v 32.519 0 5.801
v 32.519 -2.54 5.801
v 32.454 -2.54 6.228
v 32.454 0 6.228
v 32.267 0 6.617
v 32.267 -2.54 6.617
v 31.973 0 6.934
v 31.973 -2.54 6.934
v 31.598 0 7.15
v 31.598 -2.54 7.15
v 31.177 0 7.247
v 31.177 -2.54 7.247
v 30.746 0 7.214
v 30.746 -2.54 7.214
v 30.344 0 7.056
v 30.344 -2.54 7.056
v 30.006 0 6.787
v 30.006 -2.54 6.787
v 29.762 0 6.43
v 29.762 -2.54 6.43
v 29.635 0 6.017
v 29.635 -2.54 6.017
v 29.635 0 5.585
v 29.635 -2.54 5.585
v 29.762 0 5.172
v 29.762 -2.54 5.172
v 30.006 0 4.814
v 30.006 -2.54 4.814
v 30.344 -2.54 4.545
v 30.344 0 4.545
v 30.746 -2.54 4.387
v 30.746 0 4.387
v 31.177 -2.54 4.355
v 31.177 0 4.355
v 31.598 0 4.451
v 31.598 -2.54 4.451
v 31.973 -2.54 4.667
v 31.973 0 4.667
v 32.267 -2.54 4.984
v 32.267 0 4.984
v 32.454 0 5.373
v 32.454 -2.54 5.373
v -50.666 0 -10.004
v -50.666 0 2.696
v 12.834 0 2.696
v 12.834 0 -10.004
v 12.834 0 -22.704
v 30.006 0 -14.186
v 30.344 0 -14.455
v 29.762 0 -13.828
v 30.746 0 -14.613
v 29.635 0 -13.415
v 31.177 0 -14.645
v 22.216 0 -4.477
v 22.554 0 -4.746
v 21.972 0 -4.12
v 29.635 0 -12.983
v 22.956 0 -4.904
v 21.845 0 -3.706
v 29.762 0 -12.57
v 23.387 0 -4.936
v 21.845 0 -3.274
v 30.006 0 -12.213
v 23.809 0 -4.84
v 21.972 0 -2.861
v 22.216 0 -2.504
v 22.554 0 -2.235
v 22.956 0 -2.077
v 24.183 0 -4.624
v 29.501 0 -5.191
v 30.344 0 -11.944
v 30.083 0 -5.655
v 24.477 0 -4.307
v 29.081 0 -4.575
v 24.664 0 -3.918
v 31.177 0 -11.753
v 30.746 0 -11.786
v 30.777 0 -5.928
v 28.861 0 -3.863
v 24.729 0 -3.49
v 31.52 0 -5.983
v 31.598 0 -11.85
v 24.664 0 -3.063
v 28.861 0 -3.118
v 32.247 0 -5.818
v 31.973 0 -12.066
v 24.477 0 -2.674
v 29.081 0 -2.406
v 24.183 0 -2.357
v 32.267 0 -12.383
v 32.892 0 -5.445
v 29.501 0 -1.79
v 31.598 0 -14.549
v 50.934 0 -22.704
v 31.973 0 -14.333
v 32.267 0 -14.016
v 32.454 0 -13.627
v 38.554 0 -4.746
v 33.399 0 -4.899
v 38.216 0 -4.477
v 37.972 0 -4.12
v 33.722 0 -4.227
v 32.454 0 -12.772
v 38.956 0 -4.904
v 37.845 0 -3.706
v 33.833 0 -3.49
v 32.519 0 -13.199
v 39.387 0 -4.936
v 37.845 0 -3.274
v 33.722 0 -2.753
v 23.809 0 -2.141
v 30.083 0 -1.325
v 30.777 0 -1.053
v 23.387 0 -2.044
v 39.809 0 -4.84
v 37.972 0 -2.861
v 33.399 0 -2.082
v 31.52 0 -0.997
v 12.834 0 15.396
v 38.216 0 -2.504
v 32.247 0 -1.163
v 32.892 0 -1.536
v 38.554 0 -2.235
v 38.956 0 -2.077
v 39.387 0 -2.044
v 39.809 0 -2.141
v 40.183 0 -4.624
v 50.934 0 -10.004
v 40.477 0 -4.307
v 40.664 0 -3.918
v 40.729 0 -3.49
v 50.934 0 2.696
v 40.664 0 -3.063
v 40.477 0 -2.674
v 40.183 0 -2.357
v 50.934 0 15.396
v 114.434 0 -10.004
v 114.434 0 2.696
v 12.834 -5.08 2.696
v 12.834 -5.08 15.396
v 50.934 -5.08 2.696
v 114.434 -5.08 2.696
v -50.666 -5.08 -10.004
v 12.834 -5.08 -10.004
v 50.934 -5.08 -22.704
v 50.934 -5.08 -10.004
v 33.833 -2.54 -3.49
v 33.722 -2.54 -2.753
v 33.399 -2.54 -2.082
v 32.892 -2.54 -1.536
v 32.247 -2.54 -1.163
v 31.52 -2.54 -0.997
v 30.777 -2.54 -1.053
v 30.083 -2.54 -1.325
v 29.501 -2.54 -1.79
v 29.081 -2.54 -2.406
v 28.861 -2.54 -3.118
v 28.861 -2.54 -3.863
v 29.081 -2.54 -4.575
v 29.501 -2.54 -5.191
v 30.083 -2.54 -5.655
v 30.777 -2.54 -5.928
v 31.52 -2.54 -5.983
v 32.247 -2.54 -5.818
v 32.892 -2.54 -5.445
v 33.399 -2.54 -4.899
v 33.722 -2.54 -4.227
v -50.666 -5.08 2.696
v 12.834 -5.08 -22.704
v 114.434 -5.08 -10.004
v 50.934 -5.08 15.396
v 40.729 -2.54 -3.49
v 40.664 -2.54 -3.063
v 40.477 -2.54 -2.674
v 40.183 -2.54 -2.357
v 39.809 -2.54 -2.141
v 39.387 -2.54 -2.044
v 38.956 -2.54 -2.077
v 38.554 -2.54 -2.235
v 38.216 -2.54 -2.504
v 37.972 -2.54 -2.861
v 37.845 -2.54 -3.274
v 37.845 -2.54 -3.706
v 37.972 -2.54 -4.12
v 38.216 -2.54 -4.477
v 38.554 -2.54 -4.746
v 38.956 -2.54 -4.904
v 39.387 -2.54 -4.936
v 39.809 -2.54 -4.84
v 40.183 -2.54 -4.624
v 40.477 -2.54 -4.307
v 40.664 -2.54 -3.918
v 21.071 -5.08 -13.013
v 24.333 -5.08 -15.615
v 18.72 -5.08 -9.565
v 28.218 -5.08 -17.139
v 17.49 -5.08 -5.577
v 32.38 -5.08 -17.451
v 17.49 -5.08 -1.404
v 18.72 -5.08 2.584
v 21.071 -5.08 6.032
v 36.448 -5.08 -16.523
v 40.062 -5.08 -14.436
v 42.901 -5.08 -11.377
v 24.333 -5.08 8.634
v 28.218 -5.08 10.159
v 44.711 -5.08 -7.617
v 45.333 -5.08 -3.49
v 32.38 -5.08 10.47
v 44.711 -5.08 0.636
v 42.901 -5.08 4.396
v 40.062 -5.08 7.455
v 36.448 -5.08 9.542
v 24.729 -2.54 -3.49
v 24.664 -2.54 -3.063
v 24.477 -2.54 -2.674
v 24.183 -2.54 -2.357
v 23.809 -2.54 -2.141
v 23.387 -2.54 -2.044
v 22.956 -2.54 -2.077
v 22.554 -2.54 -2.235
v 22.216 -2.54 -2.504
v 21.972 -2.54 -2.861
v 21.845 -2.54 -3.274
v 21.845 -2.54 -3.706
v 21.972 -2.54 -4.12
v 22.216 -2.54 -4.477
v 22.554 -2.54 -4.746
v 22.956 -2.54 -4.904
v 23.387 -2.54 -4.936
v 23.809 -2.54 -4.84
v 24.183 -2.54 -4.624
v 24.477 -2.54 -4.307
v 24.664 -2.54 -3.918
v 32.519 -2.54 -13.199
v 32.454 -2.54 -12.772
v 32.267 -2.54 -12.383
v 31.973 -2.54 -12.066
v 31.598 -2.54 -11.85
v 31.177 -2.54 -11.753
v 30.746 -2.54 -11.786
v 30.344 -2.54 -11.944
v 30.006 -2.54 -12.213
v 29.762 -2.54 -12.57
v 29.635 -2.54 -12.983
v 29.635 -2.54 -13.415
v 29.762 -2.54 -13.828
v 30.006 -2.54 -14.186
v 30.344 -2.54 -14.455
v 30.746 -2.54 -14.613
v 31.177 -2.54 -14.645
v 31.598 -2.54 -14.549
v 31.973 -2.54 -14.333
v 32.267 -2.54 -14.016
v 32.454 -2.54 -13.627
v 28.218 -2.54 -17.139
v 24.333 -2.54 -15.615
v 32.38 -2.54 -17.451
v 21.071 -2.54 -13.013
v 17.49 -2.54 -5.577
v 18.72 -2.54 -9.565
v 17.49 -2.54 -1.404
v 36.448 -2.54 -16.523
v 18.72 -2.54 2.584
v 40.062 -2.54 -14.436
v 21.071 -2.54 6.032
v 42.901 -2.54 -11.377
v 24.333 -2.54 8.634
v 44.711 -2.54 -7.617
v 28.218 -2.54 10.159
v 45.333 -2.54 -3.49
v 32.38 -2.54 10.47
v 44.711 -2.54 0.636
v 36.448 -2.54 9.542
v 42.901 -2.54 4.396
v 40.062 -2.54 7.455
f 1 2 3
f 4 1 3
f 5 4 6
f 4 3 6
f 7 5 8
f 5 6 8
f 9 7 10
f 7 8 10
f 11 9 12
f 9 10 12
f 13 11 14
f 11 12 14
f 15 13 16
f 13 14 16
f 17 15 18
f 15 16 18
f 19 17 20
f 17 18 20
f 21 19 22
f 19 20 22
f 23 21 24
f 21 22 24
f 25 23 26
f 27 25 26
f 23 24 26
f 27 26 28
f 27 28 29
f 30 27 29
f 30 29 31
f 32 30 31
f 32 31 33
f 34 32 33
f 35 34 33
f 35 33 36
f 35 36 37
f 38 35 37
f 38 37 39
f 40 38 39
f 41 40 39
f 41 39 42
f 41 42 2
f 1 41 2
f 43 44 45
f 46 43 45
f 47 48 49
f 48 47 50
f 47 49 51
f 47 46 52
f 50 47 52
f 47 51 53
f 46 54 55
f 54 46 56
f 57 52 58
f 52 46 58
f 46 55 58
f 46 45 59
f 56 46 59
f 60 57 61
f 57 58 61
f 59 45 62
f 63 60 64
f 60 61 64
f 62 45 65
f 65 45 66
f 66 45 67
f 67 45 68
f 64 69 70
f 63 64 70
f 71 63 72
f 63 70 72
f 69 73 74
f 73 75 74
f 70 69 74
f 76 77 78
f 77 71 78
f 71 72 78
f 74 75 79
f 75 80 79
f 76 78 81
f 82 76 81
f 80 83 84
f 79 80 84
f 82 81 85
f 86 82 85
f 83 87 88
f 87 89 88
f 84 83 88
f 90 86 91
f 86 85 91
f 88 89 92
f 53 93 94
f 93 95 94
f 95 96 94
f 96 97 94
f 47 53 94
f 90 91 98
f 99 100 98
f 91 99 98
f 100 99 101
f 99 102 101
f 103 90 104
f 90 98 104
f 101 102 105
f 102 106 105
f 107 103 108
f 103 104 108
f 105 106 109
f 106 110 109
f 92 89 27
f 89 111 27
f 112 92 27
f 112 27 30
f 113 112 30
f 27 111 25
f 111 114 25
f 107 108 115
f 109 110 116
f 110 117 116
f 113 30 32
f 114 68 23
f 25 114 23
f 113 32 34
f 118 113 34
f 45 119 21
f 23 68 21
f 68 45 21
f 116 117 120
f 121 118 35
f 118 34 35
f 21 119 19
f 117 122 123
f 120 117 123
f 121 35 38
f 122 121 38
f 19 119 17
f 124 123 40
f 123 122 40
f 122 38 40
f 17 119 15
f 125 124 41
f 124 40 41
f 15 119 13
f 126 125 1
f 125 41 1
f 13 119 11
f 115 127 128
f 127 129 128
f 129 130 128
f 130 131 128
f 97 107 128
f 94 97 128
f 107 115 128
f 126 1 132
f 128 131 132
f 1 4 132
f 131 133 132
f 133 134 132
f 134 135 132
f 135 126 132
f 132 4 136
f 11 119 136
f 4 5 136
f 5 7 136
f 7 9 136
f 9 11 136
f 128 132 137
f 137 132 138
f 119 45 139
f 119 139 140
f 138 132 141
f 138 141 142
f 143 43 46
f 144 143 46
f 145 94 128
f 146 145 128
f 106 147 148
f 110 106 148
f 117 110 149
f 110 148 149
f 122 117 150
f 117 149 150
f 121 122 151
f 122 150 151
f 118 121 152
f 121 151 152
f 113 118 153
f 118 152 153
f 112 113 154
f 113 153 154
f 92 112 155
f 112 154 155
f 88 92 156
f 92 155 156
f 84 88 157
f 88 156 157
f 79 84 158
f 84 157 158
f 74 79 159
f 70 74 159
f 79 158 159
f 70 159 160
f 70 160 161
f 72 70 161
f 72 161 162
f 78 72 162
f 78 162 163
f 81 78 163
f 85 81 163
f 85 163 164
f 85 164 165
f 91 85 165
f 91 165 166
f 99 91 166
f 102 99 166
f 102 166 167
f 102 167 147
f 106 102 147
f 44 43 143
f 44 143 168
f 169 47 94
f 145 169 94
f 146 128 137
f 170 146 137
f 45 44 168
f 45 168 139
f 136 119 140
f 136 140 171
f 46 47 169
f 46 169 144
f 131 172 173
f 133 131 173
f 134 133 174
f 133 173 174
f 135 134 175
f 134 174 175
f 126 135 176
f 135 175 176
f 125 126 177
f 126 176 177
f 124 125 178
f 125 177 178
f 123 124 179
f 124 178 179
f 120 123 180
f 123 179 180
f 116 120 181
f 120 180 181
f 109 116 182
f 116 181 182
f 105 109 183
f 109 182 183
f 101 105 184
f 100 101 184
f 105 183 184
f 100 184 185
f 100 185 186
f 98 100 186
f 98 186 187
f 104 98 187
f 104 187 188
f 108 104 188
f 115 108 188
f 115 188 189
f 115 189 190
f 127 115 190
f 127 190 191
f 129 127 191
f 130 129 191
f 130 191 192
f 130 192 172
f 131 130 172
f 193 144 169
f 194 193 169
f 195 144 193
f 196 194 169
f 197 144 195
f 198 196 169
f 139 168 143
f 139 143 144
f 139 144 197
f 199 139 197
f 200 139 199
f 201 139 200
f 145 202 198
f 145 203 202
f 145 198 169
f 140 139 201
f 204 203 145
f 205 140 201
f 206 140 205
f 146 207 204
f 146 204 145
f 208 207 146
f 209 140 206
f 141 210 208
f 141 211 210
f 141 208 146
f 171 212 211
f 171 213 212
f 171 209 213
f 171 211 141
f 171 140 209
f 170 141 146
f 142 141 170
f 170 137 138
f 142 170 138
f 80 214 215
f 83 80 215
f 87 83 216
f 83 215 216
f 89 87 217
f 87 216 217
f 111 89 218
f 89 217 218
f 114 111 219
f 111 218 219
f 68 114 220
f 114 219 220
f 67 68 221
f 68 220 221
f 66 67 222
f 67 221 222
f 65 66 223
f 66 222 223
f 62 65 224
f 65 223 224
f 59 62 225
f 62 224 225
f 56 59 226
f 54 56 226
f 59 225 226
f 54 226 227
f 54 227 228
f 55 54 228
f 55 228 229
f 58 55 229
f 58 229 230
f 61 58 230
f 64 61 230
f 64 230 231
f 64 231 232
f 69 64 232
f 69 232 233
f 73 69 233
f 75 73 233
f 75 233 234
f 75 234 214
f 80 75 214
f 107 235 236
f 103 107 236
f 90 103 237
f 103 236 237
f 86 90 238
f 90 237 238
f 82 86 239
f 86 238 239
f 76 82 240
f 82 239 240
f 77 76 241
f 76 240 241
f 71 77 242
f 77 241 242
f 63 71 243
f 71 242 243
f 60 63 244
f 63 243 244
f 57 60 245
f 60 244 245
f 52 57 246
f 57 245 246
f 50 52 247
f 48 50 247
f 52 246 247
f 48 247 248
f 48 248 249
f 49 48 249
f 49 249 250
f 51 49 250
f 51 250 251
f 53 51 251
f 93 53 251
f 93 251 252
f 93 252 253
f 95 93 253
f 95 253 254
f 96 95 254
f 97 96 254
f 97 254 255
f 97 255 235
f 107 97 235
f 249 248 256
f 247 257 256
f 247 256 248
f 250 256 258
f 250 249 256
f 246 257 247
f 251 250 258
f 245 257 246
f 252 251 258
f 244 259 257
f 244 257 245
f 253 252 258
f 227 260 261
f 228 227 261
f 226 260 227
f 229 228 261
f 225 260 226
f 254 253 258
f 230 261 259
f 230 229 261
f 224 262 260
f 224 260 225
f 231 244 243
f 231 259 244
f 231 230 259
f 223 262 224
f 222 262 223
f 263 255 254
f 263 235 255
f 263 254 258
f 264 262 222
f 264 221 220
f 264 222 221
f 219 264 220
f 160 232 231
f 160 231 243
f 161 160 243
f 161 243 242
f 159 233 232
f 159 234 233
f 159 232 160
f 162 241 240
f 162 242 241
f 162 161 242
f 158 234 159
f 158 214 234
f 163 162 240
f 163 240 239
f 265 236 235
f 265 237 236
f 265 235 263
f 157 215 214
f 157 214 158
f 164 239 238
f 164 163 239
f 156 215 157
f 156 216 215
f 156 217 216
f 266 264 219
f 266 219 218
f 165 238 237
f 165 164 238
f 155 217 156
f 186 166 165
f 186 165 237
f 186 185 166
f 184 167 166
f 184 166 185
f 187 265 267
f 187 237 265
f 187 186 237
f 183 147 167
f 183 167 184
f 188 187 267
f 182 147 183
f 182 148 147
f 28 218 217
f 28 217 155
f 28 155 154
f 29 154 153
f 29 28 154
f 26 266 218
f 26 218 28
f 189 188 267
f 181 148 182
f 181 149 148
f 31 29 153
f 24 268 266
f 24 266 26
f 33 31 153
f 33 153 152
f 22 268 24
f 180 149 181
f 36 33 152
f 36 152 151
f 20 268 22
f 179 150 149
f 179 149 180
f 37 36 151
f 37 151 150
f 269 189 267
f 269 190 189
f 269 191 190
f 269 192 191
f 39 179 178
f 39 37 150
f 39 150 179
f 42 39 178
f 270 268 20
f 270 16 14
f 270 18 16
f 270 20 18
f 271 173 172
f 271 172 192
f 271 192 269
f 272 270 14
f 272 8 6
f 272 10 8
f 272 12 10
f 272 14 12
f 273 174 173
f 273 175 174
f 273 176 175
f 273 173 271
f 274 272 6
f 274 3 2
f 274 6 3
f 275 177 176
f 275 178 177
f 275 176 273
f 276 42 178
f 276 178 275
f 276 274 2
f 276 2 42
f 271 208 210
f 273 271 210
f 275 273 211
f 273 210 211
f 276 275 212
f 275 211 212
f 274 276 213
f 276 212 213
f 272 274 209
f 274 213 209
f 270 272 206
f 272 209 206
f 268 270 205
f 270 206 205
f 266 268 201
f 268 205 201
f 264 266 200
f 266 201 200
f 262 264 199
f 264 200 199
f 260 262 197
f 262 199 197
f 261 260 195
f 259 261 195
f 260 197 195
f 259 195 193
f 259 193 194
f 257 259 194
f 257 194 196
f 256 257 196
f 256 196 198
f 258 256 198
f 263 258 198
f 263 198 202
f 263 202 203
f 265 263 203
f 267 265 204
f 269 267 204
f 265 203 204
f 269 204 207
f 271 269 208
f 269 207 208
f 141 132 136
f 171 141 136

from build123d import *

# Parameters (mm, degrees)
F0_W     = 63.5
F0_H     = 12.7
F0_W_2   = 38.1
F1_DEPTH = 5.08
F2_R     = 14
F3_DEPTH = 2.54
F4_R     = 1.45
F4_R_2   = 2.5
F5_DEPTH = 25.4


with BuildPart() as f1:
    # F0 (on Front) → F1 (new body)
    with BuildSketch(Plane.XZ):
        with Locations((-18.9156212242, -3.6535147662)):
            Rectangle(F0_W, F0_H)
        with Locations((31.8843787758, 9.0464852338)):
            Rectangle(F0_W_2, F0_H)
        with Locations((31.8843787758, -3.6535147662)):
            Rectangle(F0_W_2, F0_H)
        with Locations((82.6843787758, -3.6535147662)):
            Rectangle(F0_W, F0_H)
        with Locations((31.8843787758, -16.3535147662)):
            Rectangle(F0_W_2, F0_H)
    extrude(amount=F1_DEPTH)

    # F2 (on face) → F3 (cut)
    with BuildSketch(Plane.XZ.offset(5.08)):
        with Locations((31.3334800303, -3.4903693013)):
            Circle(F2_R)
    extrude(amount=-F3_DEPTH, mode=Mode.SUBTRACT)

    # F4 (on face) → F5 (cut)
    with BuildSketch(Plane.XZ.offset(2.54)):
        with Locations((39.2787821442, -3.4903693013)):
            Circle(F4_R)
        with Locations((23.2787821442, -3.4903693013)):
            Circle(F4_R)
        with Locations((31.0685478124, -13.1993463289)):
            Circle(F4_R)
        with Locations((31.0685478124, 5.8006536711)):
            Circle(F4_R)
        with Locations((31.3334800303, -3.4903693013)):
            Circle(F4_R_2)
    extrude(amount=-F5_DEPTH, mode=Mode.SUBTRACT)


solid = f1.part
